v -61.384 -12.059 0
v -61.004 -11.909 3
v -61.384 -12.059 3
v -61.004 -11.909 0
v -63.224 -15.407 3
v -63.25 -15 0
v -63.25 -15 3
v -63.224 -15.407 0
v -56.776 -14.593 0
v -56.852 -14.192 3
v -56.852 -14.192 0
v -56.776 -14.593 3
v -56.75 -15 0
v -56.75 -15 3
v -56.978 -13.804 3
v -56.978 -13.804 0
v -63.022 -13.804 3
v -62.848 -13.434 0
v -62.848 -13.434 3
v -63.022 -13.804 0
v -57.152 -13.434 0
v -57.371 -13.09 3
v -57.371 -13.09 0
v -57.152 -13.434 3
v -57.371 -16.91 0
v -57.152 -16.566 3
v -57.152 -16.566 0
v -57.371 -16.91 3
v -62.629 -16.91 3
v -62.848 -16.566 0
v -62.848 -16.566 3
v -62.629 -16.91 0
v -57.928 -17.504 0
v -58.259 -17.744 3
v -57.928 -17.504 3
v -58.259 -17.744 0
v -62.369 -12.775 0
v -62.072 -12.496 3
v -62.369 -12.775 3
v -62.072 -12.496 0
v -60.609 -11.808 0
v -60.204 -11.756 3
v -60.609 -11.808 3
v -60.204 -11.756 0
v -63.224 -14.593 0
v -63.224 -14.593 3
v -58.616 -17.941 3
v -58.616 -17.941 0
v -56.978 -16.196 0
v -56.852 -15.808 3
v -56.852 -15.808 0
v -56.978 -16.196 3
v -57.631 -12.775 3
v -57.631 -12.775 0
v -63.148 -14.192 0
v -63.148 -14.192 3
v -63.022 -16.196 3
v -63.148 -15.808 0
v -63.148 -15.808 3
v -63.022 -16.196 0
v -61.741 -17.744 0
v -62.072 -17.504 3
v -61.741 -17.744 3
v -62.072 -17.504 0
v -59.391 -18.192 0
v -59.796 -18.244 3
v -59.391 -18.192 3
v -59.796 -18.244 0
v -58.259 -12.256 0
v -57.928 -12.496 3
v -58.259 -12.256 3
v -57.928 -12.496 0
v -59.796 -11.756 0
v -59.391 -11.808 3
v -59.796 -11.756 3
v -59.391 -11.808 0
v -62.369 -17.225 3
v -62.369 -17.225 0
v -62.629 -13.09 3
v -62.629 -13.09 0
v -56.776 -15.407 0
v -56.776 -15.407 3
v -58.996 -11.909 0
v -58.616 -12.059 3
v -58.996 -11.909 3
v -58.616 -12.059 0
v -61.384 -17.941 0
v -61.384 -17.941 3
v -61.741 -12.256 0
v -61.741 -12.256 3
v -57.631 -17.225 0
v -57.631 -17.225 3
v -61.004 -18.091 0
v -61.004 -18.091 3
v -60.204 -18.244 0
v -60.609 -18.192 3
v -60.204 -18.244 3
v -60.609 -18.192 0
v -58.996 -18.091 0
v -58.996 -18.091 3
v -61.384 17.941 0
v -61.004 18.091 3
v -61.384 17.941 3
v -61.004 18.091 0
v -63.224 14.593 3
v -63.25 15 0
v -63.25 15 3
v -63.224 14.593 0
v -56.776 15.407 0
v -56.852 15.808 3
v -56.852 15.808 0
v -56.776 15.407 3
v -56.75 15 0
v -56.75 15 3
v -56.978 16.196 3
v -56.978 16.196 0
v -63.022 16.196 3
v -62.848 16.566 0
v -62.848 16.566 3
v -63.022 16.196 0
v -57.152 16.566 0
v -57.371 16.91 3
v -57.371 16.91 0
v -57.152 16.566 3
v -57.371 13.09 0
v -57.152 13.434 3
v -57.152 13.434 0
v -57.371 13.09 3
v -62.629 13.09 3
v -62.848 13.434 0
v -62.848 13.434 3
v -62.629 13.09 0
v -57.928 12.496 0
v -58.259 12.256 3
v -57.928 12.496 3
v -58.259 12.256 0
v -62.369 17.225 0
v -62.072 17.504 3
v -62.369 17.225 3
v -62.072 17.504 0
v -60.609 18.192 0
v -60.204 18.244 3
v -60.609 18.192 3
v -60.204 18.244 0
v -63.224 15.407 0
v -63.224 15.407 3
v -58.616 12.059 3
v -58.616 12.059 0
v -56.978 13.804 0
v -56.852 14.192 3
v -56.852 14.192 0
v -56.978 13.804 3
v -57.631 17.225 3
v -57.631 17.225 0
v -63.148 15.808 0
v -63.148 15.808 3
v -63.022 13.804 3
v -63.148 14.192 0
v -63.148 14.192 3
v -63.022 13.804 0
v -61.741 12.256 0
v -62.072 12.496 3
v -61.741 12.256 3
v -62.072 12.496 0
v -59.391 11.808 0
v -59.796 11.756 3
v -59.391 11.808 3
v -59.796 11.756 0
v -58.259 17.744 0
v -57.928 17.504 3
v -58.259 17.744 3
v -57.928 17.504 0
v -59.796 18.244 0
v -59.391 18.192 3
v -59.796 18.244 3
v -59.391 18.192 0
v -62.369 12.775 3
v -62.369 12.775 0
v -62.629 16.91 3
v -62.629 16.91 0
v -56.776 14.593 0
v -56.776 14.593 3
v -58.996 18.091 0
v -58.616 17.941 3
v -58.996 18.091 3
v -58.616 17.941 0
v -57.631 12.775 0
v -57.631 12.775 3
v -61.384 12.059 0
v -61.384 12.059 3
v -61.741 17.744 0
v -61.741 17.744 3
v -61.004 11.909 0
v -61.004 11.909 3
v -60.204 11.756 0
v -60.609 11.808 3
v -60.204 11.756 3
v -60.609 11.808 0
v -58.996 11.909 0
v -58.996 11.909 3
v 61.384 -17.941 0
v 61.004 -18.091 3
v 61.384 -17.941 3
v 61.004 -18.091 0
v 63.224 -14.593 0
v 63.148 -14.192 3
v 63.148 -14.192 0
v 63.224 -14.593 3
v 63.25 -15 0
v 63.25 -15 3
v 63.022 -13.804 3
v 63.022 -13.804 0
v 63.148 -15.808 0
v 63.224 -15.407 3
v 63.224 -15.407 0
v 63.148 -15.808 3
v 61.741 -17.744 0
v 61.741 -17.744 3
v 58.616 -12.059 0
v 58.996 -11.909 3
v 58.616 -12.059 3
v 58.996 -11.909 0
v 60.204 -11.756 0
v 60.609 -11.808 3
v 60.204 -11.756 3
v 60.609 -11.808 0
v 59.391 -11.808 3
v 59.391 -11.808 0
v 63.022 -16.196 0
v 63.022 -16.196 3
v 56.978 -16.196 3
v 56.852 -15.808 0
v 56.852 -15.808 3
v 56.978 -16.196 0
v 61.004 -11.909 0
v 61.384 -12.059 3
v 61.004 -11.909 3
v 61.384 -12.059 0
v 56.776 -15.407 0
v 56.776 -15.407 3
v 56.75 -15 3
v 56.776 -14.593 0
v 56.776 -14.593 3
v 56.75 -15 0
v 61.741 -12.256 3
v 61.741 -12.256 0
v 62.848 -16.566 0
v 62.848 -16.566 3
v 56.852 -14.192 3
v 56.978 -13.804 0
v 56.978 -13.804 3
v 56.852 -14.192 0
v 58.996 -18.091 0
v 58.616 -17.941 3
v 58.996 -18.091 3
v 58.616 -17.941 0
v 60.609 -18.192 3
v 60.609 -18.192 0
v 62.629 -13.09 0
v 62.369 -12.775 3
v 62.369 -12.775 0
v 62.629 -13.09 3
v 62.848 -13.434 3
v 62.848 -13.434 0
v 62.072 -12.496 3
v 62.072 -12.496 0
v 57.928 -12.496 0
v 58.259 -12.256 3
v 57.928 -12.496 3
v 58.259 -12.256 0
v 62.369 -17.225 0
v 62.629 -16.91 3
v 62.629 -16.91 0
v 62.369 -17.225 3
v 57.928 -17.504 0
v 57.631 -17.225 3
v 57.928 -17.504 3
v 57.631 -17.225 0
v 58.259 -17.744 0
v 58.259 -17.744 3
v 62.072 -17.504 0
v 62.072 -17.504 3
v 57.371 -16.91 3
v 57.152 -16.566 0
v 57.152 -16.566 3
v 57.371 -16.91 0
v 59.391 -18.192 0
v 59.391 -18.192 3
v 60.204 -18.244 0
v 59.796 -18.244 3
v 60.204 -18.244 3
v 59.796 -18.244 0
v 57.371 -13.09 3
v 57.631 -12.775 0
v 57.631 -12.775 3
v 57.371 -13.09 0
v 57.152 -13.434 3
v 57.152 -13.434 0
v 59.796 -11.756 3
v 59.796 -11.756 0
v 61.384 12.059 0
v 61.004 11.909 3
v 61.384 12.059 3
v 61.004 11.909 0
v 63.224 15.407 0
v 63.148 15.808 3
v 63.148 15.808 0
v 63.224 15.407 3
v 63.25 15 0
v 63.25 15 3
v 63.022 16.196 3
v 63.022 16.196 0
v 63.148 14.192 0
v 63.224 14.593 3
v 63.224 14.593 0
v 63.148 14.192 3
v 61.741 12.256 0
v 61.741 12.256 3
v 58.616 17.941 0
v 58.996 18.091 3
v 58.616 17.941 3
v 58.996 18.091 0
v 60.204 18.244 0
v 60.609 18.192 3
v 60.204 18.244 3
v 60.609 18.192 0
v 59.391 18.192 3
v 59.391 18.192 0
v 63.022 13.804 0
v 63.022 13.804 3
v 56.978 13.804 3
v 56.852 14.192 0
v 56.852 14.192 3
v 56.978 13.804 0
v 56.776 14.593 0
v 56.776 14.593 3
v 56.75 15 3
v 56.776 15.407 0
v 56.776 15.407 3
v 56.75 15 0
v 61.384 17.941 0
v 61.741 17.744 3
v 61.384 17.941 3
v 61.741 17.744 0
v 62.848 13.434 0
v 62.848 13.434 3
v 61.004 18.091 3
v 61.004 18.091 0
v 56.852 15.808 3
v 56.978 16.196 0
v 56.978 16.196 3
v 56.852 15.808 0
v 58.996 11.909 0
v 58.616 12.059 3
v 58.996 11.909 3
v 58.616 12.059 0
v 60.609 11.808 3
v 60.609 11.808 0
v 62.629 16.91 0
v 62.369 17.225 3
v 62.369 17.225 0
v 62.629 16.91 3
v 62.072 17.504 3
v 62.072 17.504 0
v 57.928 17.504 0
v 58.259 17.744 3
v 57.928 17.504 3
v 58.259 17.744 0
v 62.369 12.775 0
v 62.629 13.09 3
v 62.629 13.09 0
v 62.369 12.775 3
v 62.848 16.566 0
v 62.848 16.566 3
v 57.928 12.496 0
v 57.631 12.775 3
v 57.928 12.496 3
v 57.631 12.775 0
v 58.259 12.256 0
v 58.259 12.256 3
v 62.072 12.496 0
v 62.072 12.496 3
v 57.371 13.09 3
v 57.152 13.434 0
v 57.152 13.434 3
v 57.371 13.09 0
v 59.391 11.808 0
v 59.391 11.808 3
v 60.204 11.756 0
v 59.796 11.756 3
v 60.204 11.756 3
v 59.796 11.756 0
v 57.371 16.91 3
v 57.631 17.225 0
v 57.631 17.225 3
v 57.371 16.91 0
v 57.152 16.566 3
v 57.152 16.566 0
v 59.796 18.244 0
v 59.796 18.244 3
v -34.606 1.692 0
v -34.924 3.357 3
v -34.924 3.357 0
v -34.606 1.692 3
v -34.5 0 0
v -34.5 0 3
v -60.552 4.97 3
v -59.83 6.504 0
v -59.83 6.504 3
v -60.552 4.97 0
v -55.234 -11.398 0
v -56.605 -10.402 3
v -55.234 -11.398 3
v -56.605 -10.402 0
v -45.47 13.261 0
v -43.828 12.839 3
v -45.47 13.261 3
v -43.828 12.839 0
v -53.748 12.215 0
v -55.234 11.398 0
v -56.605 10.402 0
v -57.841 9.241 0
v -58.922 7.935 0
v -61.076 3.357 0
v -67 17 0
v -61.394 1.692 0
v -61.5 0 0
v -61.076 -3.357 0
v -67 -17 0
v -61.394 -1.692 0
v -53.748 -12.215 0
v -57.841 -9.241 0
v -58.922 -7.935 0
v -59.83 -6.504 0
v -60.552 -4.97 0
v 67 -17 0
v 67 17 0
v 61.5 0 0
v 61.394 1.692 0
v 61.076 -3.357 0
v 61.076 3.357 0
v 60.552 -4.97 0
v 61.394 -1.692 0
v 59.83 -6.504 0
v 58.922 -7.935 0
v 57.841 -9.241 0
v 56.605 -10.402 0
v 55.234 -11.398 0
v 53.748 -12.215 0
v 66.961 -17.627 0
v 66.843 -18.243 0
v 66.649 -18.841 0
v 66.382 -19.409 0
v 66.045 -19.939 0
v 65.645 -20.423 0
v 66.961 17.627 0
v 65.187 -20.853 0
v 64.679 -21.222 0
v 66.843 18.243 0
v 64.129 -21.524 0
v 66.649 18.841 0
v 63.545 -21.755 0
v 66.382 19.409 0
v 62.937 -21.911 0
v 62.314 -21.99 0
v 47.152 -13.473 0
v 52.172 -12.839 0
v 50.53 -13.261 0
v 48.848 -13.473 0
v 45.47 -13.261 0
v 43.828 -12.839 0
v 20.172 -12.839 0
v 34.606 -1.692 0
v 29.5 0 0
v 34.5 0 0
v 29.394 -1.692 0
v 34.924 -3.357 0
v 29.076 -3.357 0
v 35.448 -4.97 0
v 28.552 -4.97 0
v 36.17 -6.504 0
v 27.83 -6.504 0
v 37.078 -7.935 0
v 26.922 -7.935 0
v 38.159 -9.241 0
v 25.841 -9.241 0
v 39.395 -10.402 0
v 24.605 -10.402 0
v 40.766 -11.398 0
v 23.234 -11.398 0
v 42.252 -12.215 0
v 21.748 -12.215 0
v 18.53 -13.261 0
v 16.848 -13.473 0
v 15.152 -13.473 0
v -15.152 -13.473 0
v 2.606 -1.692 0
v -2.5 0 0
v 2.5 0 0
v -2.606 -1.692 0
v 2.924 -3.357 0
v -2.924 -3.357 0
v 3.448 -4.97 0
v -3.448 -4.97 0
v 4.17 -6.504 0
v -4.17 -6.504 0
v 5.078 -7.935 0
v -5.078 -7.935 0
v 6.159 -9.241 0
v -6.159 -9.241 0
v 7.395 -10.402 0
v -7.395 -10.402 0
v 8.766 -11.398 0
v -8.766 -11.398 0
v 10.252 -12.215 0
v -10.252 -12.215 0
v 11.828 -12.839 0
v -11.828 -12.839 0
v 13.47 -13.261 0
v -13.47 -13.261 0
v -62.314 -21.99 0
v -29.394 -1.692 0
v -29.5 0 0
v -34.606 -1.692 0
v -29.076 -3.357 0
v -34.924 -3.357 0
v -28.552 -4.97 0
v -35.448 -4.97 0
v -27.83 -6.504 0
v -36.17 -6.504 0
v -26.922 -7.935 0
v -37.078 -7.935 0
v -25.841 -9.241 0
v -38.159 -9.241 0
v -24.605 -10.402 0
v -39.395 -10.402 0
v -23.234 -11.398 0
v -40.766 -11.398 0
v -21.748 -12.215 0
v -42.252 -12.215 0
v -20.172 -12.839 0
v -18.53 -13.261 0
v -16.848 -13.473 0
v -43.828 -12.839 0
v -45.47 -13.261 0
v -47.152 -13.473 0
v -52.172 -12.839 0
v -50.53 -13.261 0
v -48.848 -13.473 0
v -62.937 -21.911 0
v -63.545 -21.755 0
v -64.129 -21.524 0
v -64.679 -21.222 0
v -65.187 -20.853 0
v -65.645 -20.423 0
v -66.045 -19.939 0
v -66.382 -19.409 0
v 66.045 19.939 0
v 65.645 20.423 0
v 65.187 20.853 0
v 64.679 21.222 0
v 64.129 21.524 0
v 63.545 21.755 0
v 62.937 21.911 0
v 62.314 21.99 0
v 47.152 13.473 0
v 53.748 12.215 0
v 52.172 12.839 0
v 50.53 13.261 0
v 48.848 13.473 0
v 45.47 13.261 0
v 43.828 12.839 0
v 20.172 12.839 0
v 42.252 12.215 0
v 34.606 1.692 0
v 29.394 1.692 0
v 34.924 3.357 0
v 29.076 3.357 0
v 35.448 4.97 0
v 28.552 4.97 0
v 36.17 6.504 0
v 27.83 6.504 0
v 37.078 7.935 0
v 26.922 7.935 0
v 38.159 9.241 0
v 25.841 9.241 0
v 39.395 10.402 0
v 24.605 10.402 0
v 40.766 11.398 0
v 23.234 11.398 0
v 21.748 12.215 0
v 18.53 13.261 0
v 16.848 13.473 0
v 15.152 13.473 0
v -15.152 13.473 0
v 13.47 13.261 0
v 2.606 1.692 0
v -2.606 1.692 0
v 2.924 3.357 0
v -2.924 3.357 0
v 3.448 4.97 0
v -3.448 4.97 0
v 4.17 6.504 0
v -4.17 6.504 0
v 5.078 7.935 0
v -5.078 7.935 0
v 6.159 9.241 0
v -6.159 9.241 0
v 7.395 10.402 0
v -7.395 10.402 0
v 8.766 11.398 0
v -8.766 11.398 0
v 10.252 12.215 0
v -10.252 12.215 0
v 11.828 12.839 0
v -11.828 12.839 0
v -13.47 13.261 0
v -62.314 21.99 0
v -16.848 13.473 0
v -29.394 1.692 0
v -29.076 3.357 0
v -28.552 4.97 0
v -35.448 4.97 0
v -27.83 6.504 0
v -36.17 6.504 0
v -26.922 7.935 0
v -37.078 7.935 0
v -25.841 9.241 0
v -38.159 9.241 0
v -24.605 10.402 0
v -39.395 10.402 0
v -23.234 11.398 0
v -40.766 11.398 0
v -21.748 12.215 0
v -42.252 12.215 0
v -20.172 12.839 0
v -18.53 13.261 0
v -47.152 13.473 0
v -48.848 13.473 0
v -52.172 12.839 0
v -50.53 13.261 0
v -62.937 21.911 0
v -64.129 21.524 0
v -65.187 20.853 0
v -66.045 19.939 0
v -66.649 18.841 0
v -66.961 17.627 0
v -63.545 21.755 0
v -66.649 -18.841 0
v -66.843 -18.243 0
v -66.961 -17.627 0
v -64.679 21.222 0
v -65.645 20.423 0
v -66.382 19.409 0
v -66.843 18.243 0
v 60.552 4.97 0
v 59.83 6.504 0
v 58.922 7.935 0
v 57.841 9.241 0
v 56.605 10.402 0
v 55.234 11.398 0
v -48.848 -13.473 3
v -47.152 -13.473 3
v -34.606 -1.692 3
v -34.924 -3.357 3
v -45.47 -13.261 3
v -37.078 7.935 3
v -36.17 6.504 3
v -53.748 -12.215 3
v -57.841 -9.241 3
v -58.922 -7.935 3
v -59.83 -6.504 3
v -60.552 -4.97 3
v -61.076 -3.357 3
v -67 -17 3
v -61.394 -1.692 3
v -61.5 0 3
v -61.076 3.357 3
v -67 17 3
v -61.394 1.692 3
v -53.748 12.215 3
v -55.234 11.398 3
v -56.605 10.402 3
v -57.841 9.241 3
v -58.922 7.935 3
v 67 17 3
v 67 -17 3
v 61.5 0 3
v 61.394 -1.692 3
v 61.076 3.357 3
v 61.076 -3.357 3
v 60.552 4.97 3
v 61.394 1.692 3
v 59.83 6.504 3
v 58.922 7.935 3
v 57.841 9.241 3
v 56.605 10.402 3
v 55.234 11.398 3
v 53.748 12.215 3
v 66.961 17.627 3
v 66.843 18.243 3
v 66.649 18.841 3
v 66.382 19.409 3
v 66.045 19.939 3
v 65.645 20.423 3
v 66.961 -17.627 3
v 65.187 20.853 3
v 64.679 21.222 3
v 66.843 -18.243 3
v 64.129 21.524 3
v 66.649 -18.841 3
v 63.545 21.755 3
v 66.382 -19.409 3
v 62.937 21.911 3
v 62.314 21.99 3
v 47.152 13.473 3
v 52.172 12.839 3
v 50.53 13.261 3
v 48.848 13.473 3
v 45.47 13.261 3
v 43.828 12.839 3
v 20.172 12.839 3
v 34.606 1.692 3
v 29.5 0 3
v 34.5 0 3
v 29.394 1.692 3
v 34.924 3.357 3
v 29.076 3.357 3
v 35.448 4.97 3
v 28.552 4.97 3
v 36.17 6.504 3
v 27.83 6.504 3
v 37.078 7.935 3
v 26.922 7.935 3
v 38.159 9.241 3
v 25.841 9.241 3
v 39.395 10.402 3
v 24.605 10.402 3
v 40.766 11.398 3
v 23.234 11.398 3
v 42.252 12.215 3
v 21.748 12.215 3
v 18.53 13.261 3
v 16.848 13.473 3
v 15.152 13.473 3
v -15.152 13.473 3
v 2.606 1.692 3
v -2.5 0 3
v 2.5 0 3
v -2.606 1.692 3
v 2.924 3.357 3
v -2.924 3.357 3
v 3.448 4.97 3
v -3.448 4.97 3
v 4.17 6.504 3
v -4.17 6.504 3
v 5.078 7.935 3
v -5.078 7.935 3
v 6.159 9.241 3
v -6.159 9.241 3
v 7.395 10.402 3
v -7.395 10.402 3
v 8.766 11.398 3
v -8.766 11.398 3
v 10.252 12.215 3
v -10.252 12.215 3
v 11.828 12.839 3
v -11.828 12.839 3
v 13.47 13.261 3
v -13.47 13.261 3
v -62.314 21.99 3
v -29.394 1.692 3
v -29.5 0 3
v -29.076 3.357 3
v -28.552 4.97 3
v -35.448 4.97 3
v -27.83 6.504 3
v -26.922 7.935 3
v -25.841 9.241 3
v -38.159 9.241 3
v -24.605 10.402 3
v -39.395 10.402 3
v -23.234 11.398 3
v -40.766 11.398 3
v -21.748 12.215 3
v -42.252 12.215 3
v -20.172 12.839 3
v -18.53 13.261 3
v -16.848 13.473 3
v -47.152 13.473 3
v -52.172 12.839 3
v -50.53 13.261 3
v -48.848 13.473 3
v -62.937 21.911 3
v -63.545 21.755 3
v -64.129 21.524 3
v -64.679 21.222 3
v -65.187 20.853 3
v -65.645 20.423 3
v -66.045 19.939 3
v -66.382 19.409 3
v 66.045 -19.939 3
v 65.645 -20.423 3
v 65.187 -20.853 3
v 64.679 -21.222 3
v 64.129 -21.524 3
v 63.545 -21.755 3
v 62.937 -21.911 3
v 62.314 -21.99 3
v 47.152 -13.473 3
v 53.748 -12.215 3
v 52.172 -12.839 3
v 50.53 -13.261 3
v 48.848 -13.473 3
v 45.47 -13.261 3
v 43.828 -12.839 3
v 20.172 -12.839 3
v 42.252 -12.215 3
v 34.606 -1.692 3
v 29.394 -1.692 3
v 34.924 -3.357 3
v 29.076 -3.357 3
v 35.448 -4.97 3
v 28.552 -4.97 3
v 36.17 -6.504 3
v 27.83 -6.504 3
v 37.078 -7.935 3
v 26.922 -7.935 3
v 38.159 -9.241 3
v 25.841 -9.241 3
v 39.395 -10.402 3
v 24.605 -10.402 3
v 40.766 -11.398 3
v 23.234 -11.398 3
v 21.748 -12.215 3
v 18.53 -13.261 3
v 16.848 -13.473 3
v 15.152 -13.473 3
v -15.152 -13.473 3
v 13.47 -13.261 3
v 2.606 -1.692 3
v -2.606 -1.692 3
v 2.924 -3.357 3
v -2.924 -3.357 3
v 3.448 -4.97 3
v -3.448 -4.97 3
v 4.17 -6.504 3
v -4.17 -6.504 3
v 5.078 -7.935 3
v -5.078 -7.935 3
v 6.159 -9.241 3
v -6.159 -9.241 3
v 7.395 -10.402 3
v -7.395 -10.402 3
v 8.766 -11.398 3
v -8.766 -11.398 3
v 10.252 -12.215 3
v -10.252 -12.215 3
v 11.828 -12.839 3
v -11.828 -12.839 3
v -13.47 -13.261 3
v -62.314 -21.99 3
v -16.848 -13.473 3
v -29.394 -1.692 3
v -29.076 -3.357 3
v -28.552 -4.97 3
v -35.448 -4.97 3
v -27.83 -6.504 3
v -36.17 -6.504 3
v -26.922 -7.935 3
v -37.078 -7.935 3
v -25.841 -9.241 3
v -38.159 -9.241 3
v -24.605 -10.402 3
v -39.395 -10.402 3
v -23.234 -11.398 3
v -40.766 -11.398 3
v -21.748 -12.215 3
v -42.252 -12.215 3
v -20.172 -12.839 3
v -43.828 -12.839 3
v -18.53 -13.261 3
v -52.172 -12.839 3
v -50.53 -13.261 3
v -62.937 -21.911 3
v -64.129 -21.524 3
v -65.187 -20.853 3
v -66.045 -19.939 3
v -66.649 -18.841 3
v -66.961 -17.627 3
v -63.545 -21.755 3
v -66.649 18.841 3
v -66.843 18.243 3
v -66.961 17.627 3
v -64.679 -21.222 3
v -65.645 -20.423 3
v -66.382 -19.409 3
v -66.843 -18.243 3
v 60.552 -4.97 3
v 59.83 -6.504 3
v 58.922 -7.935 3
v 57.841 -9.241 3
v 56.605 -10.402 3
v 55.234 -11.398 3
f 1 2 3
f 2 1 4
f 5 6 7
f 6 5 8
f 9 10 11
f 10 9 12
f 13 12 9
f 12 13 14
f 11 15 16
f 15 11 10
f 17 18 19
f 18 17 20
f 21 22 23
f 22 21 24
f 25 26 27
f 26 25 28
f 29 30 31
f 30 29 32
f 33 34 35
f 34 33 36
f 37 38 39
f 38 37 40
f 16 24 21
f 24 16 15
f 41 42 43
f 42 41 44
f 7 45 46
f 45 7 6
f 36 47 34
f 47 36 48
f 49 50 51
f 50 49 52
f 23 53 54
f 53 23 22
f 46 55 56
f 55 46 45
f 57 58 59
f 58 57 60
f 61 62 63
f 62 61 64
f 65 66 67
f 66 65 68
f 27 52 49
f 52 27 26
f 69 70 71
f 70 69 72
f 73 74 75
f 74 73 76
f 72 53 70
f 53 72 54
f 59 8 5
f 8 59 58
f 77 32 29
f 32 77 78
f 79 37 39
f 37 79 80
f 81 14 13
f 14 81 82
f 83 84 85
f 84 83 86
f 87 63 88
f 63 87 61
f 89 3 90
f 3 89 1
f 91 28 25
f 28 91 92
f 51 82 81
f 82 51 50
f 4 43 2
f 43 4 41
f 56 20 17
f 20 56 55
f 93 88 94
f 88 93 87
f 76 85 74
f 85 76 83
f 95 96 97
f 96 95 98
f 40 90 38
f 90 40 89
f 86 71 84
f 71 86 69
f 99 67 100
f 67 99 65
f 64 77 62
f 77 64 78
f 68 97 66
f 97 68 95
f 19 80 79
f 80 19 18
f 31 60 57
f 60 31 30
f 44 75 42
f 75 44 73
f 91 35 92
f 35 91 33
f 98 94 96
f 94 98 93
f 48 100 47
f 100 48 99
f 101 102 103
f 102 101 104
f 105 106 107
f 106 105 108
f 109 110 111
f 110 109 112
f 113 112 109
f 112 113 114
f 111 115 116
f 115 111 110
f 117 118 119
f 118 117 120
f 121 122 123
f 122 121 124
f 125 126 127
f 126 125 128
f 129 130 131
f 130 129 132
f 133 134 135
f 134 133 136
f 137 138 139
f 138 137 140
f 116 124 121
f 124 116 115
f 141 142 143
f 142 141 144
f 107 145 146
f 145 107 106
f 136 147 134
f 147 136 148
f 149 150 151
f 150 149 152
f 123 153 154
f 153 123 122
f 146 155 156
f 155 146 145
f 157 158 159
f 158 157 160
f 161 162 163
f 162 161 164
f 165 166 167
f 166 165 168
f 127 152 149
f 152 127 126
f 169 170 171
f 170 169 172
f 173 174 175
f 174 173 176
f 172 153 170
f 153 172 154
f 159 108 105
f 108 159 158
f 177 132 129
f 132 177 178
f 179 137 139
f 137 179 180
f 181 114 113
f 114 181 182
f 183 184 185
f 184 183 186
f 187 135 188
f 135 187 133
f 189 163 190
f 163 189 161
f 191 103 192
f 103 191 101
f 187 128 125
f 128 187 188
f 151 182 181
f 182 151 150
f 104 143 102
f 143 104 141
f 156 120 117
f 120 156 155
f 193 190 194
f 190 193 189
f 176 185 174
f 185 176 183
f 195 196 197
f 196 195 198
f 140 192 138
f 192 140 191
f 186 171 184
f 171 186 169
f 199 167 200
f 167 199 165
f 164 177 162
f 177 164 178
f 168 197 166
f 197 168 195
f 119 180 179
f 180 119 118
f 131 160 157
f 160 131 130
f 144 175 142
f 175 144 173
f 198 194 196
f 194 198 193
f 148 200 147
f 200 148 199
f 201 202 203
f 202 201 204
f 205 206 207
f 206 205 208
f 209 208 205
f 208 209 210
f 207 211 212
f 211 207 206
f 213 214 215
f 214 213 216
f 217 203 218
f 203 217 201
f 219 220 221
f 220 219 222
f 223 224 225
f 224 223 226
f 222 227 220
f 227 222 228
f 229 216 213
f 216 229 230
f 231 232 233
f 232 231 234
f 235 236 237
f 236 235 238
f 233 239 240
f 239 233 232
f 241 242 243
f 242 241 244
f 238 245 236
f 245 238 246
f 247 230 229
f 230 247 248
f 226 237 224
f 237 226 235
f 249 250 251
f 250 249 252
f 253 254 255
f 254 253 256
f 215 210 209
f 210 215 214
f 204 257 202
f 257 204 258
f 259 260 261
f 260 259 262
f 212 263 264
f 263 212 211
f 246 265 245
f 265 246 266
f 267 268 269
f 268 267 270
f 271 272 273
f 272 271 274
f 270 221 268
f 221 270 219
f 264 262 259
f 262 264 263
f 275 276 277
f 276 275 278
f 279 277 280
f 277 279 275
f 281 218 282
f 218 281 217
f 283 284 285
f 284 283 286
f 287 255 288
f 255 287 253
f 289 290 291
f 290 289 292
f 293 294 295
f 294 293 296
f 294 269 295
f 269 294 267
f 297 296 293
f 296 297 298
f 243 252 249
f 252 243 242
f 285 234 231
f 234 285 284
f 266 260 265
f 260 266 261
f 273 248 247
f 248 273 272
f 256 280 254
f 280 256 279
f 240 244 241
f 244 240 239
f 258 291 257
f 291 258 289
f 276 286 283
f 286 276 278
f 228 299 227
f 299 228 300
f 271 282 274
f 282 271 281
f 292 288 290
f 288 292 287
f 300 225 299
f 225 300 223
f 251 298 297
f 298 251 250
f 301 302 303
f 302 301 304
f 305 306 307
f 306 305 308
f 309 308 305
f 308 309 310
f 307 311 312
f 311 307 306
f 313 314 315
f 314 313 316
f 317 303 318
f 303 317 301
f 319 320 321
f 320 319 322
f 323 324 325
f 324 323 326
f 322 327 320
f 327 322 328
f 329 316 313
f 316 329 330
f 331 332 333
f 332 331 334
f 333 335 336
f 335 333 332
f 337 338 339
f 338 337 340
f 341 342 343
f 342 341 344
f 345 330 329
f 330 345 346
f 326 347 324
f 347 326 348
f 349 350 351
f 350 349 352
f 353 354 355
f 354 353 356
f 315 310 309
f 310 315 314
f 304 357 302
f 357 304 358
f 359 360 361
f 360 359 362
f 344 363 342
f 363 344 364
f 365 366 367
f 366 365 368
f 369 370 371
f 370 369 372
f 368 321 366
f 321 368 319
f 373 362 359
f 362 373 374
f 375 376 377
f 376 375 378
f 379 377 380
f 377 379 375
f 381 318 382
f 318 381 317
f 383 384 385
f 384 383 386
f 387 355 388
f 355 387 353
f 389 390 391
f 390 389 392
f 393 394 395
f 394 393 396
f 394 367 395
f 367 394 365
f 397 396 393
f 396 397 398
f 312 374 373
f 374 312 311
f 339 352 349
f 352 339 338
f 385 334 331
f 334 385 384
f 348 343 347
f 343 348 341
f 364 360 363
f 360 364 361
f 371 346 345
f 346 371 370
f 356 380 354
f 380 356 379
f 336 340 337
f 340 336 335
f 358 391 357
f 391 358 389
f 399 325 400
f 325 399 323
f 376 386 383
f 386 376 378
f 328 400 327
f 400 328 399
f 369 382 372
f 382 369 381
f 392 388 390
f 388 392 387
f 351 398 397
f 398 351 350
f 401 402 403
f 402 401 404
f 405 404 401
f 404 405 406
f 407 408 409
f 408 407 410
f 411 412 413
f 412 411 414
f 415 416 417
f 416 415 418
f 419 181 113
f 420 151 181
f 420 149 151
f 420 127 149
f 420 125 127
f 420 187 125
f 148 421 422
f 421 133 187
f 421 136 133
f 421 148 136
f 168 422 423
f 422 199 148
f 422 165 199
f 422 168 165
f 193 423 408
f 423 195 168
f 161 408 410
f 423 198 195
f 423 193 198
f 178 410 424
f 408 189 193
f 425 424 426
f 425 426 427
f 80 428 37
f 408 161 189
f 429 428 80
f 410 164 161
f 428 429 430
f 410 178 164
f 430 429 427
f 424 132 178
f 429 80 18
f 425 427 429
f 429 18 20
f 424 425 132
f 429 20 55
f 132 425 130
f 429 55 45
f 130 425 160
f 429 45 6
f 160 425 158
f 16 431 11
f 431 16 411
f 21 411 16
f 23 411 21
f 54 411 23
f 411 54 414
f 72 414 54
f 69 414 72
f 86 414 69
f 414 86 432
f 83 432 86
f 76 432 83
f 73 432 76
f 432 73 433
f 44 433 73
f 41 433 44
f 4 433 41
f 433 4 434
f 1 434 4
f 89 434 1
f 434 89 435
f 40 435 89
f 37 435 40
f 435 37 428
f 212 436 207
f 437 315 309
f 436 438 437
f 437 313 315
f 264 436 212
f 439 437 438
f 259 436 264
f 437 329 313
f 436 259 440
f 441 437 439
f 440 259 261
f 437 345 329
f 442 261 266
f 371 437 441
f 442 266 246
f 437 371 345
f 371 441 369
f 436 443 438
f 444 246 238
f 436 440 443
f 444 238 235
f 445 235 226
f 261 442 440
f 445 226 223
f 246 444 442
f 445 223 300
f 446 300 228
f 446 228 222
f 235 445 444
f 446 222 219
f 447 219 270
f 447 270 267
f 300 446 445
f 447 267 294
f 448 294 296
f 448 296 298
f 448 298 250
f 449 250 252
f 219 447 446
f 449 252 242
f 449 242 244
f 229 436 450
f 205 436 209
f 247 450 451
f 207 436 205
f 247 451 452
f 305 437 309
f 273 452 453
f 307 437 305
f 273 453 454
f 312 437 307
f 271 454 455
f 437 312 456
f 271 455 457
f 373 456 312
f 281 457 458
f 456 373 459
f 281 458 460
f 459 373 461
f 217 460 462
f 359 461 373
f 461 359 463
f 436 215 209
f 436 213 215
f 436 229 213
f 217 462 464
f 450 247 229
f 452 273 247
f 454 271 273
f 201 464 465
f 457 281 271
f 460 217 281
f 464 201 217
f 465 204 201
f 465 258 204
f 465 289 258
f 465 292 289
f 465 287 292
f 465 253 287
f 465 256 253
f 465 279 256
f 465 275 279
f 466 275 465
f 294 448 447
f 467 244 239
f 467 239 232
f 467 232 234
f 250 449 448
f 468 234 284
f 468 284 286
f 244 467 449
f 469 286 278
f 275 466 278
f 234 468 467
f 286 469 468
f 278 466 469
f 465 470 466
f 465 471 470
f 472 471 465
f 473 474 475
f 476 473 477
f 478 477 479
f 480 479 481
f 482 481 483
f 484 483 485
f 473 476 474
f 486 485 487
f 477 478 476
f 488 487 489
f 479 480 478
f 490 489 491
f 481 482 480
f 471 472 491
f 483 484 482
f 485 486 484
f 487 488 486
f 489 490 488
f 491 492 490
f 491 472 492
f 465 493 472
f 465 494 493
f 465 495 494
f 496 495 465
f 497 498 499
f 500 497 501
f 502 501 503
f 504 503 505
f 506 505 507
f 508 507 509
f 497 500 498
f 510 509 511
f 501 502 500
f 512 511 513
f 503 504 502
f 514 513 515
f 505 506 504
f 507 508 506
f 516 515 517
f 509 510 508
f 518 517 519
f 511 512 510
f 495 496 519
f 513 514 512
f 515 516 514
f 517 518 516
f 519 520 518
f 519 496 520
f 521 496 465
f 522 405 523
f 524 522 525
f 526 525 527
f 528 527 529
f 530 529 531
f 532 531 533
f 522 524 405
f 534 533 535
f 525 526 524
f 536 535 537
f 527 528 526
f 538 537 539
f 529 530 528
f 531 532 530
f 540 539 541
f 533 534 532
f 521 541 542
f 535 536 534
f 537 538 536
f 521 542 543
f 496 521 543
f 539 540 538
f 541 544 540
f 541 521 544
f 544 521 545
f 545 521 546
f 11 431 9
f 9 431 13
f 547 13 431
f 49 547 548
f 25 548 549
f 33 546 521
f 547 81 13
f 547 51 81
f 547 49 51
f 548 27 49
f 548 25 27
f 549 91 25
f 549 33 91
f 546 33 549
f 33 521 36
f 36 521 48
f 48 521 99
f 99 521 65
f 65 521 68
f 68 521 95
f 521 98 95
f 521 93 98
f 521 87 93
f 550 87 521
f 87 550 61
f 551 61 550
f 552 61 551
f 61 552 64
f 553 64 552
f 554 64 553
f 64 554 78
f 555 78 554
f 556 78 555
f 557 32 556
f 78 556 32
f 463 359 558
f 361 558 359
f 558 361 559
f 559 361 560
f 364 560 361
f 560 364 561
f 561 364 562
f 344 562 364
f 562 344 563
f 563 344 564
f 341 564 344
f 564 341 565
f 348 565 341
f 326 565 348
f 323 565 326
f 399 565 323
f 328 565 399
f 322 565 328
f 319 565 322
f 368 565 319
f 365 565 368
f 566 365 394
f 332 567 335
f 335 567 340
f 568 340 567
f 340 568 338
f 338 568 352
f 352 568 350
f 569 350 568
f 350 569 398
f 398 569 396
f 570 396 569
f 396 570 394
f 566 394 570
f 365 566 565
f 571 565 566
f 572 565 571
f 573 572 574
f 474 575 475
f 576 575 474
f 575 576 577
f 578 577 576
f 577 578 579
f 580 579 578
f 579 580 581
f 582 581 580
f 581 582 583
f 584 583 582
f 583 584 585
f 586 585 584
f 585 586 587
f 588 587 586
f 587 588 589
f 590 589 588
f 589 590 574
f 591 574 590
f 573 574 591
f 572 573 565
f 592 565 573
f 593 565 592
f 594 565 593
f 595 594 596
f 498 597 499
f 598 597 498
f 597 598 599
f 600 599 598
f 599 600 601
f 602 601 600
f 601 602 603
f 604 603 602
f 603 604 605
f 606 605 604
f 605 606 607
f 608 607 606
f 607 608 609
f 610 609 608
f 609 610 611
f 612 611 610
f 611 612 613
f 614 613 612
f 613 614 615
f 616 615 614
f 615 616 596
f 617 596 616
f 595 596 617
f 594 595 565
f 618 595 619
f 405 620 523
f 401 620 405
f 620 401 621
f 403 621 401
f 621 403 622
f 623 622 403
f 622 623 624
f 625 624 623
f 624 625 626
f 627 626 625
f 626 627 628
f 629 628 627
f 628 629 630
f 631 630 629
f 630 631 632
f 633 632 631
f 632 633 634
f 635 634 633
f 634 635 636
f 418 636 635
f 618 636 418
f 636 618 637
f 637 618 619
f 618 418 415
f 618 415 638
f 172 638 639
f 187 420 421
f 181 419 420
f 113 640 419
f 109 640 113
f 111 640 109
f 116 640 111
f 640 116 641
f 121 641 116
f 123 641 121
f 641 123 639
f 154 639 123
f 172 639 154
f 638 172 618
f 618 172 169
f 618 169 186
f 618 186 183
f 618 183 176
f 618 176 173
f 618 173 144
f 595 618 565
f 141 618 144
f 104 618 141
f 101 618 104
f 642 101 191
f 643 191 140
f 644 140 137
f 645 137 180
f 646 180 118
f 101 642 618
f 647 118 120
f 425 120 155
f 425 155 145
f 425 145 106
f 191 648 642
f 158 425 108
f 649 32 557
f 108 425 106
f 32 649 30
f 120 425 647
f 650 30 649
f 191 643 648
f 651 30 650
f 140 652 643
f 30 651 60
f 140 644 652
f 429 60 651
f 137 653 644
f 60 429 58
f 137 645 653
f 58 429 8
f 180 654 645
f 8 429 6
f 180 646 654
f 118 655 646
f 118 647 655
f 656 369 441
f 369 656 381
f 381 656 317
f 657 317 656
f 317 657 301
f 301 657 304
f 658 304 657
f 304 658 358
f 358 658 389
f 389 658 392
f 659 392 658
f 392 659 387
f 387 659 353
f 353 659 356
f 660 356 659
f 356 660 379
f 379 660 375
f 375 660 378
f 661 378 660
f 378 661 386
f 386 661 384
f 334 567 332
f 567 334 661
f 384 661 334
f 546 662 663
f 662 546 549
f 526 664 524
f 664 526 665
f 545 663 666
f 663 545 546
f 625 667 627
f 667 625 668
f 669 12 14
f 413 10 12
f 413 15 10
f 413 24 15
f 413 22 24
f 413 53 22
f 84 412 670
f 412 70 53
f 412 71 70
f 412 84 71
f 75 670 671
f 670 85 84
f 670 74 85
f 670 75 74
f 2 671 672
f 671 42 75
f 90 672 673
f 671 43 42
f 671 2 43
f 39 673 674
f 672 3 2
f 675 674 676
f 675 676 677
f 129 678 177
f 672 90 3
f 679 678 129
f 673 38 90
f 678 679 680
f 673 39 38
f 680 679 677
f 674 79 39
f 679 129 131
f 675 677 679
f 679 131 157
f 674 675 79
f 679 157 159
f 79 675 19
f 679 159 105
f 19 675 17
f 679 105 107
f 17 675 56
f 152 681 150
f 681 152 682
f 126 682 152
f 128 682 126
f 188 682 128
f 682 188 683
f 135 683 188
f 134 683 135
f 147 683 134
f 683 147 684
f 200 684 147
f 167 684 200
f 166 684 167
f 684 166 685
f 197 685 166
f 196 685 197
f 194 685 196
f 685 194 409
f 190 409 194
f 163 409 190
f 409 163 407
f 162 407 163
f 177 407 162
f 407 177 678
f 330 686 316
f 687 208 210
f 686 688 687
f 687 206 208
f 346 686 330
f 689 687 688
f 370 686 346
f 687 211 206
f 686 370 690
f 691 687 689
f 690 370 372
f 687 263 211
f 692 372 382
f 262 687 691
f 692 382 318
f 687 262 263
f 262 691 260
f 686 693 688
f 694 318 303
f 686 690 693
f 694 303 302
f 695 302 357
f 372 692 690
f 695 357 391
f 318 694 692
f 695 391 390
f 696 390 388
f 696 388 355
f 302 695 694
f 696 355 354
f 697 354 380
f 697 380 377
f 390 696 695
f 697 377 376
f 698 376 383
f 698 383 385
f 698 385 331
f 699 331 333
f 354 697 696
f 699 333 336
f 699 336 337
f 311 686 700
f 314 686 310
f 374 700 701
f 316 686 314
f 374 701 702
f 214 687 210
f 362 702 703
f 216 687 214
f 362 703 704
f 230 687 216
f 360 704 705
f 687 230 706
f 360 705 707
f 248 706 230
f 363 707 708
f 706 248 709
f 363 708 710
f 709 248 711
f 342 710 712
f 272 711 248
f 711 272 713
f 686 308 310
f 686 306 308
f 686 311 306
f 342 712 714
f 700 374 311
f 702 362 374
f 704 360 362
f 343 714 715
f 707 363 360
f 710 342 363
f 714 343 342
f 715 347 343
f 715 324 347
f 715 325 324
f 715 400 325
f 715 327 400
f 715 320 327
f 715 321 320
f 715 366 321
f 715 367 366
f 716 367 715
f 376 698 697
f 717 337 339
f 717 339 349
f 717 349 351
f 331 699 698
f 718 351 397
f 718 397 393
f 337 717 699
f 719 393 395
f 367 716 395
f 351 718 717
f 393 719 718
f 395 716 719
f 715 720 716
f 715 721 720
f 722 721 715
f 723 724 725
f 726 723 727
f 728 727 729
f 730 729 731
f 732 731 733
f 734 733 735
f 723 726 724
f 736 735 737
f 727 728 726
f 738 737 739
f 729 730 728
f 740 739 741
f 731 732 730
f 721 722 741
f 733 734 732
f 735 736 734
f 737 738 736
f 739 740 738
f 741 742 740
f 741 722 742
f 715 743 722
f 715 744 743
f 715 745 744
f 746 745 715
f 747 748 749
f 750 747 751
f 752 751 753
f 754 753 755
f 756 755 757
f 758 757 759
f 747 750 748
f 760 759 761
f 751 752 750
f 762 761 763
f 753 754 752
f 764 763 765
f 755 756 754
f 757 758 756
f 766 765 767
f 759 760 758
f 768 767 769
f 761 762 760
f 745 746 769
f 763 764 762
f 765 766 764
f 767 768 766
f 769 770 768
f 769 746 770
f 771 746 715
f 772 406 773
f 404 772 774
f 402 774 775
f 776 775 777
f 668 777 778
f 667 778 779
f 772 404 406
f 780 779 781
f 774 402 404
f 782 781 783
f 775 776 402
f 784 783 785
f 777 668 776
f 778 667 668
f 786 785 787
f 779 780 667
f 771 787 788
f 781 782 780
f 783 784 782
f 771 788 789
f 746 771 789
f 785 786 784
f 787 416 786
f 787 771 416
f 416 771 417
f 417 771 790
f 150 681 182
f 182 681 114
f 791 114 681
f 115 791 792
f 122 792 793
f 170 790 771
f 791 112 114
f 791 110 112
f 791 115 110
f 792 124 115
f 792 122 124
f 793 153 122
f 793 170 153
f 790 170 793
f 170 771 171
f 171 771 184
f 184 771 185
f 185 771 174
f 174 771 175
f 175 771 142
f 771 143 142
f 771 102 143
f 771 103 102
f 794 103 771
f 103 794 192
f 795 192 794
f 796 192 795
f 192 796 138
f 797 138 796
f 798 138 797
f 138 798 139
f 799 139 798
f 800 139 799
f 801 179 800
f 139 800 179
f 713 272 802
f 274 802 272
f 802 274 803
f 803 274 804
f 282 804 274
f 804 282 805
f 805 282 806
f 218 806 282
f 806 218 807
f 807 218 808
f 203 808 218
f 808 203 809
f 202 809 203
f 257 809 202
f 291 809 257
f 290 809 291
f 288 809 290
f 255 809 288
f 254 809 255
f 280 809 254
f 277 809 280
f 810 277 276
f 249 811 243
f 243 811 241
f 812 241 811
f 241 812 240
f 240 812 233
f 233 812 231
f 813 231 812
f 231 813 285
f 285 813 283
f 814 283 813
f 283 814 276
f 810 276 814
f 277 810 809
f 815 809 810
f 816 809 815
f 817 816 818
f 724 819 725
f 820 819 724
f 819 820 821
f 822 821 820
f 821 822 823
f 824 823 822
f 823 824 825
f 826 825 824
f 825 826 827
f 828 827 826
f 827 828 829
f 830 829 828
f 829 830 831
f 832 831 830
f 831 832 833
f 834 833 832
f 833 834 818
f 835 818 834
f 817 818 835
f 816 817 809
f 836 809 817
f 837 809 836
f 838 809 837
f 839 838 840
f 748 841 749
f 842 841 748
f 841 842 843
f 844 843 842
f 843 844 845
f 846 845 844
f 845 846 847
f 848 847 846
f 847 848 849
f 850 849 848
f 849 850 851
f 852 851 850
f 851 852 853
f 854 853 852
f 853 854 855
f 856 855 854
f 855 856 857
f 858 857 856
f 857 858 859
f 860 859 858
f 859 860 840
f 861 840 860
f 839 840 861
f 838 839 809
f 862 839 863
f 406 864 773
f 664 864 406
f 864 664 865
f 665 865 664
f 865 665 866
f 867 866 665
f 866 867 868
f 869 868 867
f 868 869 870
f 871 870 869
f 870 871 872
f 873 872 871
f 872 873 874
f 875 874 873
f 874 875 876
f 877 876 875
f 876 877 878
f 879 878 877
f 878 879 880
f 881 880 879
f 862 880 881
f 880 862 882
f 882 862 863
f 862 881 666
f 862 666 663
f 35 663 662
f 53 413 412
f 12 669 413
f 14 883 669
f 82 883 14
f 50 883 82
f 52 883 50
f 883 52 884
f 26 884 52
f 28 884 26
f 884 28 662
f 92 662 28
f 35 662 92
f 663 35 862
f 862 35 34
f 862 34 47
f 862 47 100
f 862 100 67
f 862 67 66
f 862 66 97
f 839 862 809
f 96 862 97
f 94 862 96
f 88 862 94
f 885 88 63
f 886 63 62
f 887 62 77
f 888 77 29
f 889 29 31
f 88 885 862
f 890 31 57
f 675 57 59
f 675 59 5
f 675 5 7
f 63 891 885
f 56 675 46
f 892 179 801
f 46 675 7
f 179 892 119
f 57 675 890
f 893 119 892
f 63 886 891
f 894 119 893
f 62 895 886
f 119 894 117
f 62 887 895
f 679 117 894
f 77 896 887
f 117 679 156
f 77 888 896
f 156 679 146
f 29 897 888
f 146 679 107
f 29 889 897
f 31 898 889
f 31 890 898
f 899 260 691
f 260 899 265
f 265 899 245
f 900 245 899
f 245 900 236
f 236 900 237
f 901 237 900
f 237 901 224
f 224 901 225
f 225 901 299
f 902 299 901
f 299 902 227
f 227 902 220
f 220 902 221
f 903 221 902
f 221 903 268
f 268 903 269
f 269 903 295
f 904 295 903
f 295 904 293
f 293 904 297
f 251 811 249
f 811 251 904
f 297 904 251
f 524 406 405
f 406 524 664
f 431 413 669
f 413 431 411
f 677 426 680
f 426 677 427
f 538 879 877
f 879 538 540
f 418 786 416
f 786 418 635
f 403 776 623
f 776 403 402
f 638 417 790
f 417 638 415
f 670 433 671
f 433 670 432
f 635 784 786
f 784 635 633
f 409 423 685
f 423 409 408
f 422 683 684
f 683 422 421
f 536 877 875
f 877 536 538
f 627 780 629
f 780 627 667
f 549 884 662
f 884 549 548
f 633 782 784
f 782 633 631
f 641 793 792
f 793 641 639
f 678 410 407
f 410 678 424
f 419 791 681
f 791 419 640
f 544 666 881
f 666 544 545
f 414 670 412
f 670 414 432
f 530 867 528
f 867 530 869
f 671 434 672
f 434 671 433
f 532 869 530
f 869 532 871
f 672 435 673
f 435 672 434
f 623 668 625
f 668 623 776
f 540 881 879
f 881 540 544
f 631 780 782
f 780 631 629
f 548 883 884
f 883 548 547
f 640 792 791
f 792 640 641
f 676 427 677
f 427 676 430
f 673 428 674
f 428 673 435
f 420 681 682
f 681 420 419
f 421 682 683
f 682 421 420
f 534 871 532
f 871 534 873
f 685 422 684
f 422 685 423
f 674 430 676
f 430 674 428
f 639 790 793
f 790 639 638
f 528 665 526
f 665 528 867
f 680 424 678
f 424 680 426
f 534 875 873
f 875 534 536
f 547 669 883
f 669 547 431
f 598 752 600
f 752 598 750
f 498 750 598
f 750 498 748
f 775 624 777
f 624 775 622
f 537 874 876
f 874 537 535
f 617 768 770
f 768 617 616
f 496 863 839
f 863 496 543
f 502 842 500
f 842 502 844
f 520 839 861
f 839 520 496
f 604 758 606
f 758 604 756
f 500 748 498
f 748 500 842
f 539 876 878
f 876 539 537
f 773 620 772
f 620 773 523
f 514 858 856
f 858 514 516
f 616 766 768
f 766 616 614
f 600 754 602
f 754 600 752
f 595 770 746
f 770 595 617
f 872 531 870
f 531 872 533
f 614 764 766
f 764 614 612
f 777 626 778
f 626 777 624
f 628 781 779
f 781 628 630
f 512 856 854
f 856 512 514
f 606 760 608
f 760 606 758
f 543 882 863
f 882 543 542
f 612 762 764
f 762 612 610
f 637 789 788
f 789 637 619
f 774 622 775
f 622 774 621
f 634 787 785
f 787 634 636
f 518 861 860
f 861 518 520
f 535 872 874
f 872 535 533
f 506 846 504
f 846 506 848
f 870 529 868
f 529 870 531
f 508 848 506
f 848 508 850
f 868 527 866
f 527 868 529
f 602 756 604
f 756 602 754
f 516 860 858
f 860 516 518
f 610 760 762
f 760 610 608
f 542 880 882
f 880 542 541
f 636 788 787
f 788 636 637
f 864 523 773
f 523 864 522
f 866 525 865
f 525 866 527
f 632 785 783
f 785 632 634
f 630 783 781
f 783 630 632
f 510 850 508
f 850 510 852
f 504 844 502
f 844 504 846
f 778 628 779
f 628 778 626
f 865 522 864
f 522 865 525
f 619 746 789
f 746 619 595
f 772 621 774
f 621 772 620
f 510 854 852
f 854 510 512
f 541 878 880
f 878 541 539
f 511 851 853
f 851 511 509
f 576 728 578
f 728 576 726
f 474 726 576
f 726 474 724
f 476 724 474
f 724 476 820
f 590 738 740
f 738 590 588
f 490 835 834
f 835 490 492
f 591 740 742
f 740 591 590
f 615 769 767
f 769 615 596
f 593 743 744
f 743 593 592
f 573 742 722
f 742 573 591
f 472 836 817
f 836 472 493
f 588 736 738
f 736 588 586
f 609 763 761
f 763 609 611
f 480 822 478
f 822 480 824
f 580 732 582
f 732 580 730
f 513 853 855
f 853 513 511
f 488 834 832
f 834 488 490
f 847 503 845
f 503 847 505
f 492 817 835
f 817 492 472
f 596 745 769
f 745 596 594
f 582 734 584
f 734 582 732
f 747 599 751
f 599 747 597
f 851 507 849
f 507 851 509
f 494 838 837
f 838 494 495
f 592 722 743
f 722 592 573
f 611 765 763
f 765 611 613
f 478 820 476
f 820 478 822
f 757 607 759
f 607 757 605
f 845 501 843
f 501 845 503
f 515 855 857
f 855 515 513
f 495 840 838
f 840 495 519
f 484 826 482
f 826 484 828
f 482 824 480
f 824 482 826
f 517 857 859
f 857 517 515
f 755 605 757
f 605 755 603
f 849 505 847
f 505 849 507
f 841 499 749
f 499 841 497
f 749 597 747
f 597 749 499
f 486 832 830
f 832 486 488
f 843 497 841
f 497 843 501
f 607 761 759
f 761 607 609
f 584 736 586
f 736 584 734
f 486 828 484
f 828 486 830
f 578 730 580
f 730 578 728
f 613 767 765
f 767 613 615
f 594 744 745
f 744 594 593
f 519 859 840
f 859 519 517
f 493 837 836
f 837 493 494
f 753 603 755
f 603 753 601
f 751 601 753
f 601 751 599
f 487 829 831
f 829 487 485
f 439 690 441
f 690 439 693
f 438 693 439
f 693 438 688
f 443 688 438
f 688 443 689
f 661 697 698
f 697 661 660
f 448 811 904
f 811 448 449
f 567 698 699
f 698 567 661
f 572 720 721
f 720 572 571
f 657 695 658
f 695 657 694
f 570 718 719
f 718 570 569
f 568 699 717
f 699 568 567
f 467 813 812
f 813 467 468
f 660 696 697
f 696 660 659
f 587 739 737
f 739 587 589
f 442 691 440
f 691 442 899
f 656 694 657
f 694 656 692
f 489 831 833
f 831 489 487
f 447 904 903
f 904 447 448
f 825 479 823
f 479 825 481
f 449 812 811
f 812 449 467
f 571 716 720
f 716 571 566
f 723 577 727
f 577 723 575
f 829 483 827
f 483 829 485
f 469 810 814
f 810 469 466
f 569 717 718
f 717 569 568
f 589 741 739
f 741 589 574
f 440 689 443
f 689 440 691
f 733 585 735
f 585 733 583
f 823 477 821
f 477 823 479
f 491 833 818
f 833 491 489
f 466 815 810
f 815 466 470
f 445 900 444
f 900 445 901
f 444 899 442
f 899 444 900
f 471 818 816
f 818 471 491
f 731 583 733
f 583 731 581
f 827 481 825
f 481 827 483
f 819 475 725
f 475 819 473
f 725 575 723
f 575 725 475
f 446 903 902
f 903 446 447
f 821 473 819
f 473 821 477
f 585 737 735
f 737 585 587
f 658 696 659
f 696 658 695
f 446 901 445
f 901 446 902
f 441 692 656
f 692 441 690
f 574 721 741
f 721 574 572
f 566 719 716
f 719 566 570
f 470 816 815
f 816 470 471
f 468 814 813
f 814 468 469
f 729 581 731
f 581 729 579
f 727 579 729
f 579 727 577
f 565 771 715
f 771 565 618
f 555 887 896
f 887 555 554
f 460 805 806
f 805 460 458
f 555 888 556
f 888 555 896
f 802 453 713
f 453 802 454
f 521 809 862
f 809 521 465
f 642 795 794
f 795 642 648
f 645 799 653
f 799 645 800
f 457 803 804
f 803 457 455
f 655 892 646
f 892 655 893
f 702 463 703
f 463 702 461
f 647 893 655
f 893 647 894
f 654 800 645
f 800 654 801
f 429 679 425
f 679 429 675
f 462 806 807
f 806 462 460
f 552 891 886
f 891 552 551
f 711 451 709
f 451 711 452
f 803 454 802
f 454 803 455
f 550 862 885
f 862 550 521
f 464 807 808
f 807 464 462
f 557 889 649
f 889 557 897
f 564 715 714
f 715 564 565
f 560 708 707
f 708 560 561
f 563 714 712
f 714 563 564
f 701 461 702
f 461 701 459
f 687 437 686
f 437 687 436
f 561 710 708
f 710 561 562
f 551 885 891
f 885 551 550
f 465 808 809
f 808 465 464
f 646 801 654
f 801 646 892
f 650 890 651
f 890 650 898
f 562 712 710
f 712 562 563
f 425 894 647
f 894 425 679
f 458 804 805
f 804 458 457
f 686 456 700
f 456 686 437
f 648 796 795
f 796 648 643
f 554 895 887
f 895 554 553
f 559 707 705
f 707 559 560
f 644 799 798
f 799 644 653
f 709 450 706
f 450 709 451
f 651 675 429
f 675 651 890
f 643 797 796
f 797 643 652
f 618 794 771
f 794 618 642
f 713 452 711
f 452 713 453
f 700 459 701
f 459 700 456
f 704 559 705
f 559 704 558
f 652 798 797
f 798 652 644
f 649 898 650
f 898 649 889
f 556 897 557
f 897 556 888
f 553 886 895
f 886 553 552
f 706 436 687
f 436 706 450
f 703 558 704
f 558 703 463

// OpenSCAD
$fn = 50;


difference() {
	union() {
		hull() {
			translate(v = [-62.0000000000, 17.0000000000, 0]) {
				cylinder(h = 3, r = 5);
			}
			translate(v = [62.0000000000, 17.0000000000, 0]) {
				cylinder(h = 3, r = 5);
			}
			translate(v = [-62.0000000000, -17.0000000000, 0]) {
				cylinder(h = 3, r = 5);
			}
			translate(v = [62.0000000000, -17.0000000000, 0]) {
				cylinder(h = 3, r = 5);
			}
		}
	}
	union() {
		#translate(v = [-60.0000000000, -15.0000000000, -100.0000000000]) {
			cylinder(h = 200, r = 3.2500000000);
		}
		#translate(v = [-60.0000000000, 15.0000000000, -100.0000000000]) {
			cylinder(h = 200, r = 3.2500000000);
		}
		#translate(v = [60.0000000000, -15.0000000000, -100.0000000000]) {
			cylinder(h = 200, r = 3.2500000000);
		}
		#translate(v = [60.0000000000, 15.0000000000, -100.0000000000]) {
			cylinder(h = 200, r = 3.2500000000);
		}
		#translate(v = [-48.0000000000, 0, 0]) {
			cylinder(h = 3, r = 13.5000000000);
		}
		#translate(v = [-16.0000000000, 0, 0]) {
			cylinder(h = 3, r = 13.5000000000);
		}
		#translate(v = [16.0000000000, 0, 0]) {
			cylinder(h = 3, r = 13.5000000000);
		}
		#translate(v = [48.0000000000, 0, 0]) {
			cylinder(h = 3, r = 13.5000000000);
		}
	}
}
